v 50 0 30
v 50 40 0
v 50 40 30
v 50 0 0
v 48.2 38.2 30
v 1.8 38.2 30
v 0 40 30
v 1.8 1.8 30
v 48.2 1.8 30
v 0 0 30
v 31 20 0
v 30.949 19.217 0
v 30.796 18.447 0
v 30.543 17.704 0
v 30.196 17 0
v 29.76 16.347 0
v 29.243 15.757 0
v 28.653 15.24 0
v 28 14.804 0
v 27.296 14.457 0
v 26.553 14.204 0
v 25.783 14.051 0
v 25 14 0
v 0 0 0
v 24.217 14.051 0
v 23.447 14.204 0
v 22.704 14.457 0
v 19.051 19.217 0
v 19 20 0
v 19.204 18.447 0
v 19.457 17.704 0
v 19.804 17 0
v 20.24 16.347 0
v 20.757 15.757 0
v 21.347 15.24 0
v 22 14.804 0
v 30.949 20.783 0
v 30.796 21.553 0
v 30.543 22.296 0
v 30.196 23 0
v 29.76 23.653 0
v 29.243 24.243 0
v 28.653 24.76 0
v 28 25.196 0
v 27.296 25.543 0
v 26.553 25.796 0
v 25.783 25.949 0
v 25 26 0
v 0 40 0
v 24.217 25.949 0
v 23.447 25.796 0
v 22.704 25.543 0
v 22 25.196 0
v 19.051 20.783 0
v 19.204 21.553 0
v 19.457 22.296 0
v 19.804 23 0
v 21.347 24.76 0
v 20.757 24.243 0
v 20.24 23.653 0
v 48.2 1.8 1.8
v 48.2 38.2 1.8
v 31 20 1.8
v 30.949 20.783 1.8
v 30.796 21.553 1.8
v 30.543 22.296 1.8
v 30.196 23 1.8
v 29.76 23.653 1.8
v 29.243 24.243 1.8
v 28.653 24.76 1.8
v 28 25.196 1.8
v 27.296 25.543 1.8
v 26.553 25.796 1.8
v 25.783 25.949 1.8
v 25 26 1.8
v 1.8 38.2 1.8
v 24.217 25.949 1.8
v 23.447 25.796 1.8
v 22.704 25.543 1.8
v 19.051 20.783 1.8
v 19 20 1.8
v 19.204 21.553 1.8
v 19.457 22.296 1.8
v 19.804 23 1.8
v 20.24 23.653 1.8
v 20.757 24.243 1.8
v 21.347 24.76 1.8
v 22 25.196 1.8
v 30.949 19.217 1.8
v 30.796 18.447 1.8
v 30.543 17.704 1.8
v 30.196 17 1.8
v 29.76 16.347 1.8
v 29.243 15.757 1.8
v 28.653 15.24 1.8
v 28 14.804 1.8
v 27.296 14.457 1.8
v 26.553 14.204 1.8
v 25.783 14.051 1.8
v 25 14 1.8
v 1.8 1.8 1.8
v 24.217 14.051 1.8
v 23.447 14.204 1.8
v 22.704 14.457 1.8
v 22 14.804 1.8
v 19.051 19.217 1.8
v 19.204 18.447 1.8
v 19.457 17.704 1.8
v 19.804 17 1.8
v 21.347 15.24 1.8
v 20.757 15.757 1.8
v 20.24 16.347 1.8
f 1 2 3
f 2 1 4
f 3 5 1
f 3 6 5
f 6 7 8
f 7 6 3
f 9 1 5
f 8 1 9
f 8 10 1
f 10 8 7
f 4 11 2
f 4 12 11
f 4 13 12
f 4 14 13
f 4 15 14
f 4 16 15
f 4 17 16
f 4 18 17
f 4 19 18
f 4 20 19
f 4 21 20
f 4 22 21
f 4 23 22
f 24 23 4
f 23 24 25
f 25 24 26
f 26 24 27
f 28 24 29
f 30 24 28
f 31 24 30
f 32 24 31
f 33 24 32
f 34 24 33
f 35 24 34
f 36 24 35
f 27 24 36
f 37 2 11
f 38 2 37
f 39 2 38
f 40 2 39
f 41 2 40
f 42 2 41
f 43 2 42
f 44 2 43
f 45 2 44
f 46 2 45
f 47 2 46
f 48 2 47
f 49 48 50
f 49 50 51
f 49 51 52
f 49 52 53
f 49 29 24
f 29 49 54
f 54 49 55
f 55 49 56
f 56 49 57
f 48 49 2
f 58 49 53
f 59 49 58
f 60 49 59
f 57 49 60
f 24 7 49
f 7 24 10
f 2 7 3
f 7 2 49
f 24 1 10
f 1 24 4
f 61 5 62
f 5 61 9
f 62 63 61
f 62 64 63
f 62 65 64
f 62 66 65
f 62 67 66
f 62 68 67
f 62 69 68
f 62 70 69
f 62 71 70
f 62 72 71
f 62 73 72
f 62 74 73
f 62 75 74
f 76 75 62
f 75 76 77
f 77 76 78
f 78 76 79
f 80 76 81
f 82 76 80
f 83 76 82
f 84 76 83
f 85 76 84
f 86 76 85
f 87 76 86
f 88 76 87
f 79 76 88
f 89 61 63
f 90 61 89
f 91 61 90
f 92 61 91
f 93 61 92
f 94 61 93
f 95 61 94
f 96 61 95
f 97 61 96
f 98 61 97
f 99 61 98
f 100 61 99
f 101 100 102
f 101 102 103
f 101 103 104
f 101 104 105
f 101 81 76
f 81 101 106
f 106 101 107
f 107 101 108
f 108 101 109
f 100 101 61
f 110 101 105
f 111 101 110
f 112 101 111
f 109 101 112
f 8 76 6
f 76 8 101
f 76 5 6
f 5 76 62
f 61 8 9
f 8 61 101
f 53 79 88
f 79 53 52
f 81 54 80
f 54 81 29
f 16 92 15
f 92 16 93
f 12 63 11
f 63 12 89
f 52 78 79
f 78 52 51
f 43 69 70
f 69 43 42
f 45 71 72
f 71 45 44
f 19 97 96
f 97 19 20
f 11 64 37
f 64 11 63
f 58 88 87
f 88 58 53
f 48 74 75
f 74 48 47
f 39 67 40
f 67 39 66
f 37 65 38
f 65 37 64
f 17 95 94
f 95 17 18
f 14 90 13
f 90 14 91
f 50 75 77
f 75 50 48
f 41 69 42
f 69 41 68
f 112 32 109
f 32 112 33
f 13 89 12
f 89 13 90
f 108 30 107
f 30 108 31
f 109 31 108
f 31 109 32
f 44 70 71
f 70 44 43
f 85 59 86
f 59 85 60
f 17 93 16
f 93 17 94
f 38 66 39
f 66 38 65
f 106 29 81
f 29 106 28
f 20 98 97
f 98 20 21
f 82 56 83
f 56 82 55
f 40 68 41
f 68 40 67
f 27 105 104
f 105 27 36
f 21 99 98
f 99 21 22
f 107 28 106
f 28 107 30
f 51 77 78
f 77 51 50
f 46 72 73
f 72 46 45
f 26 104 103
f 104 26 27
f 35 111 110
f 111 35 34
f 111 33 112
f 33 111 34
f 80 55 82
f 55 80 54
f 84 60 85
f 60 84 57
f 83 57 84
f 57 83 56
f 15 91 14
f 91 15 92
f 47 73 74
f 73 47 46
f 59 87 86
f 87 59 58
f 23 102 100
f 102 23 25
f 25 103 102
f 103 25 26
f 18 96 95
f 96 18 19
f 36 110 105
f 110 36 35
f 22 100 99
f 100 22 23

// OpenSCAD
// Open-top box with centered through-hole in the floor
outer_w = 50;
outer_l = 40;
outer_h = 30;
wall = 1.8;
hole_d = 12;
$fn = 48;

difference() {
  cube([outer_w, outer_l, outer_h]);
  translate([wall, wall, wall])
    cube([outer_w - 2 * wall, outer_l - 2 * wall, outer_h - wall + 0.1]);
  translate([outer_w / 2, outer_l / 2, -0.1])
    cylinder(d = hole_d, h = wall + 0.2);
}
